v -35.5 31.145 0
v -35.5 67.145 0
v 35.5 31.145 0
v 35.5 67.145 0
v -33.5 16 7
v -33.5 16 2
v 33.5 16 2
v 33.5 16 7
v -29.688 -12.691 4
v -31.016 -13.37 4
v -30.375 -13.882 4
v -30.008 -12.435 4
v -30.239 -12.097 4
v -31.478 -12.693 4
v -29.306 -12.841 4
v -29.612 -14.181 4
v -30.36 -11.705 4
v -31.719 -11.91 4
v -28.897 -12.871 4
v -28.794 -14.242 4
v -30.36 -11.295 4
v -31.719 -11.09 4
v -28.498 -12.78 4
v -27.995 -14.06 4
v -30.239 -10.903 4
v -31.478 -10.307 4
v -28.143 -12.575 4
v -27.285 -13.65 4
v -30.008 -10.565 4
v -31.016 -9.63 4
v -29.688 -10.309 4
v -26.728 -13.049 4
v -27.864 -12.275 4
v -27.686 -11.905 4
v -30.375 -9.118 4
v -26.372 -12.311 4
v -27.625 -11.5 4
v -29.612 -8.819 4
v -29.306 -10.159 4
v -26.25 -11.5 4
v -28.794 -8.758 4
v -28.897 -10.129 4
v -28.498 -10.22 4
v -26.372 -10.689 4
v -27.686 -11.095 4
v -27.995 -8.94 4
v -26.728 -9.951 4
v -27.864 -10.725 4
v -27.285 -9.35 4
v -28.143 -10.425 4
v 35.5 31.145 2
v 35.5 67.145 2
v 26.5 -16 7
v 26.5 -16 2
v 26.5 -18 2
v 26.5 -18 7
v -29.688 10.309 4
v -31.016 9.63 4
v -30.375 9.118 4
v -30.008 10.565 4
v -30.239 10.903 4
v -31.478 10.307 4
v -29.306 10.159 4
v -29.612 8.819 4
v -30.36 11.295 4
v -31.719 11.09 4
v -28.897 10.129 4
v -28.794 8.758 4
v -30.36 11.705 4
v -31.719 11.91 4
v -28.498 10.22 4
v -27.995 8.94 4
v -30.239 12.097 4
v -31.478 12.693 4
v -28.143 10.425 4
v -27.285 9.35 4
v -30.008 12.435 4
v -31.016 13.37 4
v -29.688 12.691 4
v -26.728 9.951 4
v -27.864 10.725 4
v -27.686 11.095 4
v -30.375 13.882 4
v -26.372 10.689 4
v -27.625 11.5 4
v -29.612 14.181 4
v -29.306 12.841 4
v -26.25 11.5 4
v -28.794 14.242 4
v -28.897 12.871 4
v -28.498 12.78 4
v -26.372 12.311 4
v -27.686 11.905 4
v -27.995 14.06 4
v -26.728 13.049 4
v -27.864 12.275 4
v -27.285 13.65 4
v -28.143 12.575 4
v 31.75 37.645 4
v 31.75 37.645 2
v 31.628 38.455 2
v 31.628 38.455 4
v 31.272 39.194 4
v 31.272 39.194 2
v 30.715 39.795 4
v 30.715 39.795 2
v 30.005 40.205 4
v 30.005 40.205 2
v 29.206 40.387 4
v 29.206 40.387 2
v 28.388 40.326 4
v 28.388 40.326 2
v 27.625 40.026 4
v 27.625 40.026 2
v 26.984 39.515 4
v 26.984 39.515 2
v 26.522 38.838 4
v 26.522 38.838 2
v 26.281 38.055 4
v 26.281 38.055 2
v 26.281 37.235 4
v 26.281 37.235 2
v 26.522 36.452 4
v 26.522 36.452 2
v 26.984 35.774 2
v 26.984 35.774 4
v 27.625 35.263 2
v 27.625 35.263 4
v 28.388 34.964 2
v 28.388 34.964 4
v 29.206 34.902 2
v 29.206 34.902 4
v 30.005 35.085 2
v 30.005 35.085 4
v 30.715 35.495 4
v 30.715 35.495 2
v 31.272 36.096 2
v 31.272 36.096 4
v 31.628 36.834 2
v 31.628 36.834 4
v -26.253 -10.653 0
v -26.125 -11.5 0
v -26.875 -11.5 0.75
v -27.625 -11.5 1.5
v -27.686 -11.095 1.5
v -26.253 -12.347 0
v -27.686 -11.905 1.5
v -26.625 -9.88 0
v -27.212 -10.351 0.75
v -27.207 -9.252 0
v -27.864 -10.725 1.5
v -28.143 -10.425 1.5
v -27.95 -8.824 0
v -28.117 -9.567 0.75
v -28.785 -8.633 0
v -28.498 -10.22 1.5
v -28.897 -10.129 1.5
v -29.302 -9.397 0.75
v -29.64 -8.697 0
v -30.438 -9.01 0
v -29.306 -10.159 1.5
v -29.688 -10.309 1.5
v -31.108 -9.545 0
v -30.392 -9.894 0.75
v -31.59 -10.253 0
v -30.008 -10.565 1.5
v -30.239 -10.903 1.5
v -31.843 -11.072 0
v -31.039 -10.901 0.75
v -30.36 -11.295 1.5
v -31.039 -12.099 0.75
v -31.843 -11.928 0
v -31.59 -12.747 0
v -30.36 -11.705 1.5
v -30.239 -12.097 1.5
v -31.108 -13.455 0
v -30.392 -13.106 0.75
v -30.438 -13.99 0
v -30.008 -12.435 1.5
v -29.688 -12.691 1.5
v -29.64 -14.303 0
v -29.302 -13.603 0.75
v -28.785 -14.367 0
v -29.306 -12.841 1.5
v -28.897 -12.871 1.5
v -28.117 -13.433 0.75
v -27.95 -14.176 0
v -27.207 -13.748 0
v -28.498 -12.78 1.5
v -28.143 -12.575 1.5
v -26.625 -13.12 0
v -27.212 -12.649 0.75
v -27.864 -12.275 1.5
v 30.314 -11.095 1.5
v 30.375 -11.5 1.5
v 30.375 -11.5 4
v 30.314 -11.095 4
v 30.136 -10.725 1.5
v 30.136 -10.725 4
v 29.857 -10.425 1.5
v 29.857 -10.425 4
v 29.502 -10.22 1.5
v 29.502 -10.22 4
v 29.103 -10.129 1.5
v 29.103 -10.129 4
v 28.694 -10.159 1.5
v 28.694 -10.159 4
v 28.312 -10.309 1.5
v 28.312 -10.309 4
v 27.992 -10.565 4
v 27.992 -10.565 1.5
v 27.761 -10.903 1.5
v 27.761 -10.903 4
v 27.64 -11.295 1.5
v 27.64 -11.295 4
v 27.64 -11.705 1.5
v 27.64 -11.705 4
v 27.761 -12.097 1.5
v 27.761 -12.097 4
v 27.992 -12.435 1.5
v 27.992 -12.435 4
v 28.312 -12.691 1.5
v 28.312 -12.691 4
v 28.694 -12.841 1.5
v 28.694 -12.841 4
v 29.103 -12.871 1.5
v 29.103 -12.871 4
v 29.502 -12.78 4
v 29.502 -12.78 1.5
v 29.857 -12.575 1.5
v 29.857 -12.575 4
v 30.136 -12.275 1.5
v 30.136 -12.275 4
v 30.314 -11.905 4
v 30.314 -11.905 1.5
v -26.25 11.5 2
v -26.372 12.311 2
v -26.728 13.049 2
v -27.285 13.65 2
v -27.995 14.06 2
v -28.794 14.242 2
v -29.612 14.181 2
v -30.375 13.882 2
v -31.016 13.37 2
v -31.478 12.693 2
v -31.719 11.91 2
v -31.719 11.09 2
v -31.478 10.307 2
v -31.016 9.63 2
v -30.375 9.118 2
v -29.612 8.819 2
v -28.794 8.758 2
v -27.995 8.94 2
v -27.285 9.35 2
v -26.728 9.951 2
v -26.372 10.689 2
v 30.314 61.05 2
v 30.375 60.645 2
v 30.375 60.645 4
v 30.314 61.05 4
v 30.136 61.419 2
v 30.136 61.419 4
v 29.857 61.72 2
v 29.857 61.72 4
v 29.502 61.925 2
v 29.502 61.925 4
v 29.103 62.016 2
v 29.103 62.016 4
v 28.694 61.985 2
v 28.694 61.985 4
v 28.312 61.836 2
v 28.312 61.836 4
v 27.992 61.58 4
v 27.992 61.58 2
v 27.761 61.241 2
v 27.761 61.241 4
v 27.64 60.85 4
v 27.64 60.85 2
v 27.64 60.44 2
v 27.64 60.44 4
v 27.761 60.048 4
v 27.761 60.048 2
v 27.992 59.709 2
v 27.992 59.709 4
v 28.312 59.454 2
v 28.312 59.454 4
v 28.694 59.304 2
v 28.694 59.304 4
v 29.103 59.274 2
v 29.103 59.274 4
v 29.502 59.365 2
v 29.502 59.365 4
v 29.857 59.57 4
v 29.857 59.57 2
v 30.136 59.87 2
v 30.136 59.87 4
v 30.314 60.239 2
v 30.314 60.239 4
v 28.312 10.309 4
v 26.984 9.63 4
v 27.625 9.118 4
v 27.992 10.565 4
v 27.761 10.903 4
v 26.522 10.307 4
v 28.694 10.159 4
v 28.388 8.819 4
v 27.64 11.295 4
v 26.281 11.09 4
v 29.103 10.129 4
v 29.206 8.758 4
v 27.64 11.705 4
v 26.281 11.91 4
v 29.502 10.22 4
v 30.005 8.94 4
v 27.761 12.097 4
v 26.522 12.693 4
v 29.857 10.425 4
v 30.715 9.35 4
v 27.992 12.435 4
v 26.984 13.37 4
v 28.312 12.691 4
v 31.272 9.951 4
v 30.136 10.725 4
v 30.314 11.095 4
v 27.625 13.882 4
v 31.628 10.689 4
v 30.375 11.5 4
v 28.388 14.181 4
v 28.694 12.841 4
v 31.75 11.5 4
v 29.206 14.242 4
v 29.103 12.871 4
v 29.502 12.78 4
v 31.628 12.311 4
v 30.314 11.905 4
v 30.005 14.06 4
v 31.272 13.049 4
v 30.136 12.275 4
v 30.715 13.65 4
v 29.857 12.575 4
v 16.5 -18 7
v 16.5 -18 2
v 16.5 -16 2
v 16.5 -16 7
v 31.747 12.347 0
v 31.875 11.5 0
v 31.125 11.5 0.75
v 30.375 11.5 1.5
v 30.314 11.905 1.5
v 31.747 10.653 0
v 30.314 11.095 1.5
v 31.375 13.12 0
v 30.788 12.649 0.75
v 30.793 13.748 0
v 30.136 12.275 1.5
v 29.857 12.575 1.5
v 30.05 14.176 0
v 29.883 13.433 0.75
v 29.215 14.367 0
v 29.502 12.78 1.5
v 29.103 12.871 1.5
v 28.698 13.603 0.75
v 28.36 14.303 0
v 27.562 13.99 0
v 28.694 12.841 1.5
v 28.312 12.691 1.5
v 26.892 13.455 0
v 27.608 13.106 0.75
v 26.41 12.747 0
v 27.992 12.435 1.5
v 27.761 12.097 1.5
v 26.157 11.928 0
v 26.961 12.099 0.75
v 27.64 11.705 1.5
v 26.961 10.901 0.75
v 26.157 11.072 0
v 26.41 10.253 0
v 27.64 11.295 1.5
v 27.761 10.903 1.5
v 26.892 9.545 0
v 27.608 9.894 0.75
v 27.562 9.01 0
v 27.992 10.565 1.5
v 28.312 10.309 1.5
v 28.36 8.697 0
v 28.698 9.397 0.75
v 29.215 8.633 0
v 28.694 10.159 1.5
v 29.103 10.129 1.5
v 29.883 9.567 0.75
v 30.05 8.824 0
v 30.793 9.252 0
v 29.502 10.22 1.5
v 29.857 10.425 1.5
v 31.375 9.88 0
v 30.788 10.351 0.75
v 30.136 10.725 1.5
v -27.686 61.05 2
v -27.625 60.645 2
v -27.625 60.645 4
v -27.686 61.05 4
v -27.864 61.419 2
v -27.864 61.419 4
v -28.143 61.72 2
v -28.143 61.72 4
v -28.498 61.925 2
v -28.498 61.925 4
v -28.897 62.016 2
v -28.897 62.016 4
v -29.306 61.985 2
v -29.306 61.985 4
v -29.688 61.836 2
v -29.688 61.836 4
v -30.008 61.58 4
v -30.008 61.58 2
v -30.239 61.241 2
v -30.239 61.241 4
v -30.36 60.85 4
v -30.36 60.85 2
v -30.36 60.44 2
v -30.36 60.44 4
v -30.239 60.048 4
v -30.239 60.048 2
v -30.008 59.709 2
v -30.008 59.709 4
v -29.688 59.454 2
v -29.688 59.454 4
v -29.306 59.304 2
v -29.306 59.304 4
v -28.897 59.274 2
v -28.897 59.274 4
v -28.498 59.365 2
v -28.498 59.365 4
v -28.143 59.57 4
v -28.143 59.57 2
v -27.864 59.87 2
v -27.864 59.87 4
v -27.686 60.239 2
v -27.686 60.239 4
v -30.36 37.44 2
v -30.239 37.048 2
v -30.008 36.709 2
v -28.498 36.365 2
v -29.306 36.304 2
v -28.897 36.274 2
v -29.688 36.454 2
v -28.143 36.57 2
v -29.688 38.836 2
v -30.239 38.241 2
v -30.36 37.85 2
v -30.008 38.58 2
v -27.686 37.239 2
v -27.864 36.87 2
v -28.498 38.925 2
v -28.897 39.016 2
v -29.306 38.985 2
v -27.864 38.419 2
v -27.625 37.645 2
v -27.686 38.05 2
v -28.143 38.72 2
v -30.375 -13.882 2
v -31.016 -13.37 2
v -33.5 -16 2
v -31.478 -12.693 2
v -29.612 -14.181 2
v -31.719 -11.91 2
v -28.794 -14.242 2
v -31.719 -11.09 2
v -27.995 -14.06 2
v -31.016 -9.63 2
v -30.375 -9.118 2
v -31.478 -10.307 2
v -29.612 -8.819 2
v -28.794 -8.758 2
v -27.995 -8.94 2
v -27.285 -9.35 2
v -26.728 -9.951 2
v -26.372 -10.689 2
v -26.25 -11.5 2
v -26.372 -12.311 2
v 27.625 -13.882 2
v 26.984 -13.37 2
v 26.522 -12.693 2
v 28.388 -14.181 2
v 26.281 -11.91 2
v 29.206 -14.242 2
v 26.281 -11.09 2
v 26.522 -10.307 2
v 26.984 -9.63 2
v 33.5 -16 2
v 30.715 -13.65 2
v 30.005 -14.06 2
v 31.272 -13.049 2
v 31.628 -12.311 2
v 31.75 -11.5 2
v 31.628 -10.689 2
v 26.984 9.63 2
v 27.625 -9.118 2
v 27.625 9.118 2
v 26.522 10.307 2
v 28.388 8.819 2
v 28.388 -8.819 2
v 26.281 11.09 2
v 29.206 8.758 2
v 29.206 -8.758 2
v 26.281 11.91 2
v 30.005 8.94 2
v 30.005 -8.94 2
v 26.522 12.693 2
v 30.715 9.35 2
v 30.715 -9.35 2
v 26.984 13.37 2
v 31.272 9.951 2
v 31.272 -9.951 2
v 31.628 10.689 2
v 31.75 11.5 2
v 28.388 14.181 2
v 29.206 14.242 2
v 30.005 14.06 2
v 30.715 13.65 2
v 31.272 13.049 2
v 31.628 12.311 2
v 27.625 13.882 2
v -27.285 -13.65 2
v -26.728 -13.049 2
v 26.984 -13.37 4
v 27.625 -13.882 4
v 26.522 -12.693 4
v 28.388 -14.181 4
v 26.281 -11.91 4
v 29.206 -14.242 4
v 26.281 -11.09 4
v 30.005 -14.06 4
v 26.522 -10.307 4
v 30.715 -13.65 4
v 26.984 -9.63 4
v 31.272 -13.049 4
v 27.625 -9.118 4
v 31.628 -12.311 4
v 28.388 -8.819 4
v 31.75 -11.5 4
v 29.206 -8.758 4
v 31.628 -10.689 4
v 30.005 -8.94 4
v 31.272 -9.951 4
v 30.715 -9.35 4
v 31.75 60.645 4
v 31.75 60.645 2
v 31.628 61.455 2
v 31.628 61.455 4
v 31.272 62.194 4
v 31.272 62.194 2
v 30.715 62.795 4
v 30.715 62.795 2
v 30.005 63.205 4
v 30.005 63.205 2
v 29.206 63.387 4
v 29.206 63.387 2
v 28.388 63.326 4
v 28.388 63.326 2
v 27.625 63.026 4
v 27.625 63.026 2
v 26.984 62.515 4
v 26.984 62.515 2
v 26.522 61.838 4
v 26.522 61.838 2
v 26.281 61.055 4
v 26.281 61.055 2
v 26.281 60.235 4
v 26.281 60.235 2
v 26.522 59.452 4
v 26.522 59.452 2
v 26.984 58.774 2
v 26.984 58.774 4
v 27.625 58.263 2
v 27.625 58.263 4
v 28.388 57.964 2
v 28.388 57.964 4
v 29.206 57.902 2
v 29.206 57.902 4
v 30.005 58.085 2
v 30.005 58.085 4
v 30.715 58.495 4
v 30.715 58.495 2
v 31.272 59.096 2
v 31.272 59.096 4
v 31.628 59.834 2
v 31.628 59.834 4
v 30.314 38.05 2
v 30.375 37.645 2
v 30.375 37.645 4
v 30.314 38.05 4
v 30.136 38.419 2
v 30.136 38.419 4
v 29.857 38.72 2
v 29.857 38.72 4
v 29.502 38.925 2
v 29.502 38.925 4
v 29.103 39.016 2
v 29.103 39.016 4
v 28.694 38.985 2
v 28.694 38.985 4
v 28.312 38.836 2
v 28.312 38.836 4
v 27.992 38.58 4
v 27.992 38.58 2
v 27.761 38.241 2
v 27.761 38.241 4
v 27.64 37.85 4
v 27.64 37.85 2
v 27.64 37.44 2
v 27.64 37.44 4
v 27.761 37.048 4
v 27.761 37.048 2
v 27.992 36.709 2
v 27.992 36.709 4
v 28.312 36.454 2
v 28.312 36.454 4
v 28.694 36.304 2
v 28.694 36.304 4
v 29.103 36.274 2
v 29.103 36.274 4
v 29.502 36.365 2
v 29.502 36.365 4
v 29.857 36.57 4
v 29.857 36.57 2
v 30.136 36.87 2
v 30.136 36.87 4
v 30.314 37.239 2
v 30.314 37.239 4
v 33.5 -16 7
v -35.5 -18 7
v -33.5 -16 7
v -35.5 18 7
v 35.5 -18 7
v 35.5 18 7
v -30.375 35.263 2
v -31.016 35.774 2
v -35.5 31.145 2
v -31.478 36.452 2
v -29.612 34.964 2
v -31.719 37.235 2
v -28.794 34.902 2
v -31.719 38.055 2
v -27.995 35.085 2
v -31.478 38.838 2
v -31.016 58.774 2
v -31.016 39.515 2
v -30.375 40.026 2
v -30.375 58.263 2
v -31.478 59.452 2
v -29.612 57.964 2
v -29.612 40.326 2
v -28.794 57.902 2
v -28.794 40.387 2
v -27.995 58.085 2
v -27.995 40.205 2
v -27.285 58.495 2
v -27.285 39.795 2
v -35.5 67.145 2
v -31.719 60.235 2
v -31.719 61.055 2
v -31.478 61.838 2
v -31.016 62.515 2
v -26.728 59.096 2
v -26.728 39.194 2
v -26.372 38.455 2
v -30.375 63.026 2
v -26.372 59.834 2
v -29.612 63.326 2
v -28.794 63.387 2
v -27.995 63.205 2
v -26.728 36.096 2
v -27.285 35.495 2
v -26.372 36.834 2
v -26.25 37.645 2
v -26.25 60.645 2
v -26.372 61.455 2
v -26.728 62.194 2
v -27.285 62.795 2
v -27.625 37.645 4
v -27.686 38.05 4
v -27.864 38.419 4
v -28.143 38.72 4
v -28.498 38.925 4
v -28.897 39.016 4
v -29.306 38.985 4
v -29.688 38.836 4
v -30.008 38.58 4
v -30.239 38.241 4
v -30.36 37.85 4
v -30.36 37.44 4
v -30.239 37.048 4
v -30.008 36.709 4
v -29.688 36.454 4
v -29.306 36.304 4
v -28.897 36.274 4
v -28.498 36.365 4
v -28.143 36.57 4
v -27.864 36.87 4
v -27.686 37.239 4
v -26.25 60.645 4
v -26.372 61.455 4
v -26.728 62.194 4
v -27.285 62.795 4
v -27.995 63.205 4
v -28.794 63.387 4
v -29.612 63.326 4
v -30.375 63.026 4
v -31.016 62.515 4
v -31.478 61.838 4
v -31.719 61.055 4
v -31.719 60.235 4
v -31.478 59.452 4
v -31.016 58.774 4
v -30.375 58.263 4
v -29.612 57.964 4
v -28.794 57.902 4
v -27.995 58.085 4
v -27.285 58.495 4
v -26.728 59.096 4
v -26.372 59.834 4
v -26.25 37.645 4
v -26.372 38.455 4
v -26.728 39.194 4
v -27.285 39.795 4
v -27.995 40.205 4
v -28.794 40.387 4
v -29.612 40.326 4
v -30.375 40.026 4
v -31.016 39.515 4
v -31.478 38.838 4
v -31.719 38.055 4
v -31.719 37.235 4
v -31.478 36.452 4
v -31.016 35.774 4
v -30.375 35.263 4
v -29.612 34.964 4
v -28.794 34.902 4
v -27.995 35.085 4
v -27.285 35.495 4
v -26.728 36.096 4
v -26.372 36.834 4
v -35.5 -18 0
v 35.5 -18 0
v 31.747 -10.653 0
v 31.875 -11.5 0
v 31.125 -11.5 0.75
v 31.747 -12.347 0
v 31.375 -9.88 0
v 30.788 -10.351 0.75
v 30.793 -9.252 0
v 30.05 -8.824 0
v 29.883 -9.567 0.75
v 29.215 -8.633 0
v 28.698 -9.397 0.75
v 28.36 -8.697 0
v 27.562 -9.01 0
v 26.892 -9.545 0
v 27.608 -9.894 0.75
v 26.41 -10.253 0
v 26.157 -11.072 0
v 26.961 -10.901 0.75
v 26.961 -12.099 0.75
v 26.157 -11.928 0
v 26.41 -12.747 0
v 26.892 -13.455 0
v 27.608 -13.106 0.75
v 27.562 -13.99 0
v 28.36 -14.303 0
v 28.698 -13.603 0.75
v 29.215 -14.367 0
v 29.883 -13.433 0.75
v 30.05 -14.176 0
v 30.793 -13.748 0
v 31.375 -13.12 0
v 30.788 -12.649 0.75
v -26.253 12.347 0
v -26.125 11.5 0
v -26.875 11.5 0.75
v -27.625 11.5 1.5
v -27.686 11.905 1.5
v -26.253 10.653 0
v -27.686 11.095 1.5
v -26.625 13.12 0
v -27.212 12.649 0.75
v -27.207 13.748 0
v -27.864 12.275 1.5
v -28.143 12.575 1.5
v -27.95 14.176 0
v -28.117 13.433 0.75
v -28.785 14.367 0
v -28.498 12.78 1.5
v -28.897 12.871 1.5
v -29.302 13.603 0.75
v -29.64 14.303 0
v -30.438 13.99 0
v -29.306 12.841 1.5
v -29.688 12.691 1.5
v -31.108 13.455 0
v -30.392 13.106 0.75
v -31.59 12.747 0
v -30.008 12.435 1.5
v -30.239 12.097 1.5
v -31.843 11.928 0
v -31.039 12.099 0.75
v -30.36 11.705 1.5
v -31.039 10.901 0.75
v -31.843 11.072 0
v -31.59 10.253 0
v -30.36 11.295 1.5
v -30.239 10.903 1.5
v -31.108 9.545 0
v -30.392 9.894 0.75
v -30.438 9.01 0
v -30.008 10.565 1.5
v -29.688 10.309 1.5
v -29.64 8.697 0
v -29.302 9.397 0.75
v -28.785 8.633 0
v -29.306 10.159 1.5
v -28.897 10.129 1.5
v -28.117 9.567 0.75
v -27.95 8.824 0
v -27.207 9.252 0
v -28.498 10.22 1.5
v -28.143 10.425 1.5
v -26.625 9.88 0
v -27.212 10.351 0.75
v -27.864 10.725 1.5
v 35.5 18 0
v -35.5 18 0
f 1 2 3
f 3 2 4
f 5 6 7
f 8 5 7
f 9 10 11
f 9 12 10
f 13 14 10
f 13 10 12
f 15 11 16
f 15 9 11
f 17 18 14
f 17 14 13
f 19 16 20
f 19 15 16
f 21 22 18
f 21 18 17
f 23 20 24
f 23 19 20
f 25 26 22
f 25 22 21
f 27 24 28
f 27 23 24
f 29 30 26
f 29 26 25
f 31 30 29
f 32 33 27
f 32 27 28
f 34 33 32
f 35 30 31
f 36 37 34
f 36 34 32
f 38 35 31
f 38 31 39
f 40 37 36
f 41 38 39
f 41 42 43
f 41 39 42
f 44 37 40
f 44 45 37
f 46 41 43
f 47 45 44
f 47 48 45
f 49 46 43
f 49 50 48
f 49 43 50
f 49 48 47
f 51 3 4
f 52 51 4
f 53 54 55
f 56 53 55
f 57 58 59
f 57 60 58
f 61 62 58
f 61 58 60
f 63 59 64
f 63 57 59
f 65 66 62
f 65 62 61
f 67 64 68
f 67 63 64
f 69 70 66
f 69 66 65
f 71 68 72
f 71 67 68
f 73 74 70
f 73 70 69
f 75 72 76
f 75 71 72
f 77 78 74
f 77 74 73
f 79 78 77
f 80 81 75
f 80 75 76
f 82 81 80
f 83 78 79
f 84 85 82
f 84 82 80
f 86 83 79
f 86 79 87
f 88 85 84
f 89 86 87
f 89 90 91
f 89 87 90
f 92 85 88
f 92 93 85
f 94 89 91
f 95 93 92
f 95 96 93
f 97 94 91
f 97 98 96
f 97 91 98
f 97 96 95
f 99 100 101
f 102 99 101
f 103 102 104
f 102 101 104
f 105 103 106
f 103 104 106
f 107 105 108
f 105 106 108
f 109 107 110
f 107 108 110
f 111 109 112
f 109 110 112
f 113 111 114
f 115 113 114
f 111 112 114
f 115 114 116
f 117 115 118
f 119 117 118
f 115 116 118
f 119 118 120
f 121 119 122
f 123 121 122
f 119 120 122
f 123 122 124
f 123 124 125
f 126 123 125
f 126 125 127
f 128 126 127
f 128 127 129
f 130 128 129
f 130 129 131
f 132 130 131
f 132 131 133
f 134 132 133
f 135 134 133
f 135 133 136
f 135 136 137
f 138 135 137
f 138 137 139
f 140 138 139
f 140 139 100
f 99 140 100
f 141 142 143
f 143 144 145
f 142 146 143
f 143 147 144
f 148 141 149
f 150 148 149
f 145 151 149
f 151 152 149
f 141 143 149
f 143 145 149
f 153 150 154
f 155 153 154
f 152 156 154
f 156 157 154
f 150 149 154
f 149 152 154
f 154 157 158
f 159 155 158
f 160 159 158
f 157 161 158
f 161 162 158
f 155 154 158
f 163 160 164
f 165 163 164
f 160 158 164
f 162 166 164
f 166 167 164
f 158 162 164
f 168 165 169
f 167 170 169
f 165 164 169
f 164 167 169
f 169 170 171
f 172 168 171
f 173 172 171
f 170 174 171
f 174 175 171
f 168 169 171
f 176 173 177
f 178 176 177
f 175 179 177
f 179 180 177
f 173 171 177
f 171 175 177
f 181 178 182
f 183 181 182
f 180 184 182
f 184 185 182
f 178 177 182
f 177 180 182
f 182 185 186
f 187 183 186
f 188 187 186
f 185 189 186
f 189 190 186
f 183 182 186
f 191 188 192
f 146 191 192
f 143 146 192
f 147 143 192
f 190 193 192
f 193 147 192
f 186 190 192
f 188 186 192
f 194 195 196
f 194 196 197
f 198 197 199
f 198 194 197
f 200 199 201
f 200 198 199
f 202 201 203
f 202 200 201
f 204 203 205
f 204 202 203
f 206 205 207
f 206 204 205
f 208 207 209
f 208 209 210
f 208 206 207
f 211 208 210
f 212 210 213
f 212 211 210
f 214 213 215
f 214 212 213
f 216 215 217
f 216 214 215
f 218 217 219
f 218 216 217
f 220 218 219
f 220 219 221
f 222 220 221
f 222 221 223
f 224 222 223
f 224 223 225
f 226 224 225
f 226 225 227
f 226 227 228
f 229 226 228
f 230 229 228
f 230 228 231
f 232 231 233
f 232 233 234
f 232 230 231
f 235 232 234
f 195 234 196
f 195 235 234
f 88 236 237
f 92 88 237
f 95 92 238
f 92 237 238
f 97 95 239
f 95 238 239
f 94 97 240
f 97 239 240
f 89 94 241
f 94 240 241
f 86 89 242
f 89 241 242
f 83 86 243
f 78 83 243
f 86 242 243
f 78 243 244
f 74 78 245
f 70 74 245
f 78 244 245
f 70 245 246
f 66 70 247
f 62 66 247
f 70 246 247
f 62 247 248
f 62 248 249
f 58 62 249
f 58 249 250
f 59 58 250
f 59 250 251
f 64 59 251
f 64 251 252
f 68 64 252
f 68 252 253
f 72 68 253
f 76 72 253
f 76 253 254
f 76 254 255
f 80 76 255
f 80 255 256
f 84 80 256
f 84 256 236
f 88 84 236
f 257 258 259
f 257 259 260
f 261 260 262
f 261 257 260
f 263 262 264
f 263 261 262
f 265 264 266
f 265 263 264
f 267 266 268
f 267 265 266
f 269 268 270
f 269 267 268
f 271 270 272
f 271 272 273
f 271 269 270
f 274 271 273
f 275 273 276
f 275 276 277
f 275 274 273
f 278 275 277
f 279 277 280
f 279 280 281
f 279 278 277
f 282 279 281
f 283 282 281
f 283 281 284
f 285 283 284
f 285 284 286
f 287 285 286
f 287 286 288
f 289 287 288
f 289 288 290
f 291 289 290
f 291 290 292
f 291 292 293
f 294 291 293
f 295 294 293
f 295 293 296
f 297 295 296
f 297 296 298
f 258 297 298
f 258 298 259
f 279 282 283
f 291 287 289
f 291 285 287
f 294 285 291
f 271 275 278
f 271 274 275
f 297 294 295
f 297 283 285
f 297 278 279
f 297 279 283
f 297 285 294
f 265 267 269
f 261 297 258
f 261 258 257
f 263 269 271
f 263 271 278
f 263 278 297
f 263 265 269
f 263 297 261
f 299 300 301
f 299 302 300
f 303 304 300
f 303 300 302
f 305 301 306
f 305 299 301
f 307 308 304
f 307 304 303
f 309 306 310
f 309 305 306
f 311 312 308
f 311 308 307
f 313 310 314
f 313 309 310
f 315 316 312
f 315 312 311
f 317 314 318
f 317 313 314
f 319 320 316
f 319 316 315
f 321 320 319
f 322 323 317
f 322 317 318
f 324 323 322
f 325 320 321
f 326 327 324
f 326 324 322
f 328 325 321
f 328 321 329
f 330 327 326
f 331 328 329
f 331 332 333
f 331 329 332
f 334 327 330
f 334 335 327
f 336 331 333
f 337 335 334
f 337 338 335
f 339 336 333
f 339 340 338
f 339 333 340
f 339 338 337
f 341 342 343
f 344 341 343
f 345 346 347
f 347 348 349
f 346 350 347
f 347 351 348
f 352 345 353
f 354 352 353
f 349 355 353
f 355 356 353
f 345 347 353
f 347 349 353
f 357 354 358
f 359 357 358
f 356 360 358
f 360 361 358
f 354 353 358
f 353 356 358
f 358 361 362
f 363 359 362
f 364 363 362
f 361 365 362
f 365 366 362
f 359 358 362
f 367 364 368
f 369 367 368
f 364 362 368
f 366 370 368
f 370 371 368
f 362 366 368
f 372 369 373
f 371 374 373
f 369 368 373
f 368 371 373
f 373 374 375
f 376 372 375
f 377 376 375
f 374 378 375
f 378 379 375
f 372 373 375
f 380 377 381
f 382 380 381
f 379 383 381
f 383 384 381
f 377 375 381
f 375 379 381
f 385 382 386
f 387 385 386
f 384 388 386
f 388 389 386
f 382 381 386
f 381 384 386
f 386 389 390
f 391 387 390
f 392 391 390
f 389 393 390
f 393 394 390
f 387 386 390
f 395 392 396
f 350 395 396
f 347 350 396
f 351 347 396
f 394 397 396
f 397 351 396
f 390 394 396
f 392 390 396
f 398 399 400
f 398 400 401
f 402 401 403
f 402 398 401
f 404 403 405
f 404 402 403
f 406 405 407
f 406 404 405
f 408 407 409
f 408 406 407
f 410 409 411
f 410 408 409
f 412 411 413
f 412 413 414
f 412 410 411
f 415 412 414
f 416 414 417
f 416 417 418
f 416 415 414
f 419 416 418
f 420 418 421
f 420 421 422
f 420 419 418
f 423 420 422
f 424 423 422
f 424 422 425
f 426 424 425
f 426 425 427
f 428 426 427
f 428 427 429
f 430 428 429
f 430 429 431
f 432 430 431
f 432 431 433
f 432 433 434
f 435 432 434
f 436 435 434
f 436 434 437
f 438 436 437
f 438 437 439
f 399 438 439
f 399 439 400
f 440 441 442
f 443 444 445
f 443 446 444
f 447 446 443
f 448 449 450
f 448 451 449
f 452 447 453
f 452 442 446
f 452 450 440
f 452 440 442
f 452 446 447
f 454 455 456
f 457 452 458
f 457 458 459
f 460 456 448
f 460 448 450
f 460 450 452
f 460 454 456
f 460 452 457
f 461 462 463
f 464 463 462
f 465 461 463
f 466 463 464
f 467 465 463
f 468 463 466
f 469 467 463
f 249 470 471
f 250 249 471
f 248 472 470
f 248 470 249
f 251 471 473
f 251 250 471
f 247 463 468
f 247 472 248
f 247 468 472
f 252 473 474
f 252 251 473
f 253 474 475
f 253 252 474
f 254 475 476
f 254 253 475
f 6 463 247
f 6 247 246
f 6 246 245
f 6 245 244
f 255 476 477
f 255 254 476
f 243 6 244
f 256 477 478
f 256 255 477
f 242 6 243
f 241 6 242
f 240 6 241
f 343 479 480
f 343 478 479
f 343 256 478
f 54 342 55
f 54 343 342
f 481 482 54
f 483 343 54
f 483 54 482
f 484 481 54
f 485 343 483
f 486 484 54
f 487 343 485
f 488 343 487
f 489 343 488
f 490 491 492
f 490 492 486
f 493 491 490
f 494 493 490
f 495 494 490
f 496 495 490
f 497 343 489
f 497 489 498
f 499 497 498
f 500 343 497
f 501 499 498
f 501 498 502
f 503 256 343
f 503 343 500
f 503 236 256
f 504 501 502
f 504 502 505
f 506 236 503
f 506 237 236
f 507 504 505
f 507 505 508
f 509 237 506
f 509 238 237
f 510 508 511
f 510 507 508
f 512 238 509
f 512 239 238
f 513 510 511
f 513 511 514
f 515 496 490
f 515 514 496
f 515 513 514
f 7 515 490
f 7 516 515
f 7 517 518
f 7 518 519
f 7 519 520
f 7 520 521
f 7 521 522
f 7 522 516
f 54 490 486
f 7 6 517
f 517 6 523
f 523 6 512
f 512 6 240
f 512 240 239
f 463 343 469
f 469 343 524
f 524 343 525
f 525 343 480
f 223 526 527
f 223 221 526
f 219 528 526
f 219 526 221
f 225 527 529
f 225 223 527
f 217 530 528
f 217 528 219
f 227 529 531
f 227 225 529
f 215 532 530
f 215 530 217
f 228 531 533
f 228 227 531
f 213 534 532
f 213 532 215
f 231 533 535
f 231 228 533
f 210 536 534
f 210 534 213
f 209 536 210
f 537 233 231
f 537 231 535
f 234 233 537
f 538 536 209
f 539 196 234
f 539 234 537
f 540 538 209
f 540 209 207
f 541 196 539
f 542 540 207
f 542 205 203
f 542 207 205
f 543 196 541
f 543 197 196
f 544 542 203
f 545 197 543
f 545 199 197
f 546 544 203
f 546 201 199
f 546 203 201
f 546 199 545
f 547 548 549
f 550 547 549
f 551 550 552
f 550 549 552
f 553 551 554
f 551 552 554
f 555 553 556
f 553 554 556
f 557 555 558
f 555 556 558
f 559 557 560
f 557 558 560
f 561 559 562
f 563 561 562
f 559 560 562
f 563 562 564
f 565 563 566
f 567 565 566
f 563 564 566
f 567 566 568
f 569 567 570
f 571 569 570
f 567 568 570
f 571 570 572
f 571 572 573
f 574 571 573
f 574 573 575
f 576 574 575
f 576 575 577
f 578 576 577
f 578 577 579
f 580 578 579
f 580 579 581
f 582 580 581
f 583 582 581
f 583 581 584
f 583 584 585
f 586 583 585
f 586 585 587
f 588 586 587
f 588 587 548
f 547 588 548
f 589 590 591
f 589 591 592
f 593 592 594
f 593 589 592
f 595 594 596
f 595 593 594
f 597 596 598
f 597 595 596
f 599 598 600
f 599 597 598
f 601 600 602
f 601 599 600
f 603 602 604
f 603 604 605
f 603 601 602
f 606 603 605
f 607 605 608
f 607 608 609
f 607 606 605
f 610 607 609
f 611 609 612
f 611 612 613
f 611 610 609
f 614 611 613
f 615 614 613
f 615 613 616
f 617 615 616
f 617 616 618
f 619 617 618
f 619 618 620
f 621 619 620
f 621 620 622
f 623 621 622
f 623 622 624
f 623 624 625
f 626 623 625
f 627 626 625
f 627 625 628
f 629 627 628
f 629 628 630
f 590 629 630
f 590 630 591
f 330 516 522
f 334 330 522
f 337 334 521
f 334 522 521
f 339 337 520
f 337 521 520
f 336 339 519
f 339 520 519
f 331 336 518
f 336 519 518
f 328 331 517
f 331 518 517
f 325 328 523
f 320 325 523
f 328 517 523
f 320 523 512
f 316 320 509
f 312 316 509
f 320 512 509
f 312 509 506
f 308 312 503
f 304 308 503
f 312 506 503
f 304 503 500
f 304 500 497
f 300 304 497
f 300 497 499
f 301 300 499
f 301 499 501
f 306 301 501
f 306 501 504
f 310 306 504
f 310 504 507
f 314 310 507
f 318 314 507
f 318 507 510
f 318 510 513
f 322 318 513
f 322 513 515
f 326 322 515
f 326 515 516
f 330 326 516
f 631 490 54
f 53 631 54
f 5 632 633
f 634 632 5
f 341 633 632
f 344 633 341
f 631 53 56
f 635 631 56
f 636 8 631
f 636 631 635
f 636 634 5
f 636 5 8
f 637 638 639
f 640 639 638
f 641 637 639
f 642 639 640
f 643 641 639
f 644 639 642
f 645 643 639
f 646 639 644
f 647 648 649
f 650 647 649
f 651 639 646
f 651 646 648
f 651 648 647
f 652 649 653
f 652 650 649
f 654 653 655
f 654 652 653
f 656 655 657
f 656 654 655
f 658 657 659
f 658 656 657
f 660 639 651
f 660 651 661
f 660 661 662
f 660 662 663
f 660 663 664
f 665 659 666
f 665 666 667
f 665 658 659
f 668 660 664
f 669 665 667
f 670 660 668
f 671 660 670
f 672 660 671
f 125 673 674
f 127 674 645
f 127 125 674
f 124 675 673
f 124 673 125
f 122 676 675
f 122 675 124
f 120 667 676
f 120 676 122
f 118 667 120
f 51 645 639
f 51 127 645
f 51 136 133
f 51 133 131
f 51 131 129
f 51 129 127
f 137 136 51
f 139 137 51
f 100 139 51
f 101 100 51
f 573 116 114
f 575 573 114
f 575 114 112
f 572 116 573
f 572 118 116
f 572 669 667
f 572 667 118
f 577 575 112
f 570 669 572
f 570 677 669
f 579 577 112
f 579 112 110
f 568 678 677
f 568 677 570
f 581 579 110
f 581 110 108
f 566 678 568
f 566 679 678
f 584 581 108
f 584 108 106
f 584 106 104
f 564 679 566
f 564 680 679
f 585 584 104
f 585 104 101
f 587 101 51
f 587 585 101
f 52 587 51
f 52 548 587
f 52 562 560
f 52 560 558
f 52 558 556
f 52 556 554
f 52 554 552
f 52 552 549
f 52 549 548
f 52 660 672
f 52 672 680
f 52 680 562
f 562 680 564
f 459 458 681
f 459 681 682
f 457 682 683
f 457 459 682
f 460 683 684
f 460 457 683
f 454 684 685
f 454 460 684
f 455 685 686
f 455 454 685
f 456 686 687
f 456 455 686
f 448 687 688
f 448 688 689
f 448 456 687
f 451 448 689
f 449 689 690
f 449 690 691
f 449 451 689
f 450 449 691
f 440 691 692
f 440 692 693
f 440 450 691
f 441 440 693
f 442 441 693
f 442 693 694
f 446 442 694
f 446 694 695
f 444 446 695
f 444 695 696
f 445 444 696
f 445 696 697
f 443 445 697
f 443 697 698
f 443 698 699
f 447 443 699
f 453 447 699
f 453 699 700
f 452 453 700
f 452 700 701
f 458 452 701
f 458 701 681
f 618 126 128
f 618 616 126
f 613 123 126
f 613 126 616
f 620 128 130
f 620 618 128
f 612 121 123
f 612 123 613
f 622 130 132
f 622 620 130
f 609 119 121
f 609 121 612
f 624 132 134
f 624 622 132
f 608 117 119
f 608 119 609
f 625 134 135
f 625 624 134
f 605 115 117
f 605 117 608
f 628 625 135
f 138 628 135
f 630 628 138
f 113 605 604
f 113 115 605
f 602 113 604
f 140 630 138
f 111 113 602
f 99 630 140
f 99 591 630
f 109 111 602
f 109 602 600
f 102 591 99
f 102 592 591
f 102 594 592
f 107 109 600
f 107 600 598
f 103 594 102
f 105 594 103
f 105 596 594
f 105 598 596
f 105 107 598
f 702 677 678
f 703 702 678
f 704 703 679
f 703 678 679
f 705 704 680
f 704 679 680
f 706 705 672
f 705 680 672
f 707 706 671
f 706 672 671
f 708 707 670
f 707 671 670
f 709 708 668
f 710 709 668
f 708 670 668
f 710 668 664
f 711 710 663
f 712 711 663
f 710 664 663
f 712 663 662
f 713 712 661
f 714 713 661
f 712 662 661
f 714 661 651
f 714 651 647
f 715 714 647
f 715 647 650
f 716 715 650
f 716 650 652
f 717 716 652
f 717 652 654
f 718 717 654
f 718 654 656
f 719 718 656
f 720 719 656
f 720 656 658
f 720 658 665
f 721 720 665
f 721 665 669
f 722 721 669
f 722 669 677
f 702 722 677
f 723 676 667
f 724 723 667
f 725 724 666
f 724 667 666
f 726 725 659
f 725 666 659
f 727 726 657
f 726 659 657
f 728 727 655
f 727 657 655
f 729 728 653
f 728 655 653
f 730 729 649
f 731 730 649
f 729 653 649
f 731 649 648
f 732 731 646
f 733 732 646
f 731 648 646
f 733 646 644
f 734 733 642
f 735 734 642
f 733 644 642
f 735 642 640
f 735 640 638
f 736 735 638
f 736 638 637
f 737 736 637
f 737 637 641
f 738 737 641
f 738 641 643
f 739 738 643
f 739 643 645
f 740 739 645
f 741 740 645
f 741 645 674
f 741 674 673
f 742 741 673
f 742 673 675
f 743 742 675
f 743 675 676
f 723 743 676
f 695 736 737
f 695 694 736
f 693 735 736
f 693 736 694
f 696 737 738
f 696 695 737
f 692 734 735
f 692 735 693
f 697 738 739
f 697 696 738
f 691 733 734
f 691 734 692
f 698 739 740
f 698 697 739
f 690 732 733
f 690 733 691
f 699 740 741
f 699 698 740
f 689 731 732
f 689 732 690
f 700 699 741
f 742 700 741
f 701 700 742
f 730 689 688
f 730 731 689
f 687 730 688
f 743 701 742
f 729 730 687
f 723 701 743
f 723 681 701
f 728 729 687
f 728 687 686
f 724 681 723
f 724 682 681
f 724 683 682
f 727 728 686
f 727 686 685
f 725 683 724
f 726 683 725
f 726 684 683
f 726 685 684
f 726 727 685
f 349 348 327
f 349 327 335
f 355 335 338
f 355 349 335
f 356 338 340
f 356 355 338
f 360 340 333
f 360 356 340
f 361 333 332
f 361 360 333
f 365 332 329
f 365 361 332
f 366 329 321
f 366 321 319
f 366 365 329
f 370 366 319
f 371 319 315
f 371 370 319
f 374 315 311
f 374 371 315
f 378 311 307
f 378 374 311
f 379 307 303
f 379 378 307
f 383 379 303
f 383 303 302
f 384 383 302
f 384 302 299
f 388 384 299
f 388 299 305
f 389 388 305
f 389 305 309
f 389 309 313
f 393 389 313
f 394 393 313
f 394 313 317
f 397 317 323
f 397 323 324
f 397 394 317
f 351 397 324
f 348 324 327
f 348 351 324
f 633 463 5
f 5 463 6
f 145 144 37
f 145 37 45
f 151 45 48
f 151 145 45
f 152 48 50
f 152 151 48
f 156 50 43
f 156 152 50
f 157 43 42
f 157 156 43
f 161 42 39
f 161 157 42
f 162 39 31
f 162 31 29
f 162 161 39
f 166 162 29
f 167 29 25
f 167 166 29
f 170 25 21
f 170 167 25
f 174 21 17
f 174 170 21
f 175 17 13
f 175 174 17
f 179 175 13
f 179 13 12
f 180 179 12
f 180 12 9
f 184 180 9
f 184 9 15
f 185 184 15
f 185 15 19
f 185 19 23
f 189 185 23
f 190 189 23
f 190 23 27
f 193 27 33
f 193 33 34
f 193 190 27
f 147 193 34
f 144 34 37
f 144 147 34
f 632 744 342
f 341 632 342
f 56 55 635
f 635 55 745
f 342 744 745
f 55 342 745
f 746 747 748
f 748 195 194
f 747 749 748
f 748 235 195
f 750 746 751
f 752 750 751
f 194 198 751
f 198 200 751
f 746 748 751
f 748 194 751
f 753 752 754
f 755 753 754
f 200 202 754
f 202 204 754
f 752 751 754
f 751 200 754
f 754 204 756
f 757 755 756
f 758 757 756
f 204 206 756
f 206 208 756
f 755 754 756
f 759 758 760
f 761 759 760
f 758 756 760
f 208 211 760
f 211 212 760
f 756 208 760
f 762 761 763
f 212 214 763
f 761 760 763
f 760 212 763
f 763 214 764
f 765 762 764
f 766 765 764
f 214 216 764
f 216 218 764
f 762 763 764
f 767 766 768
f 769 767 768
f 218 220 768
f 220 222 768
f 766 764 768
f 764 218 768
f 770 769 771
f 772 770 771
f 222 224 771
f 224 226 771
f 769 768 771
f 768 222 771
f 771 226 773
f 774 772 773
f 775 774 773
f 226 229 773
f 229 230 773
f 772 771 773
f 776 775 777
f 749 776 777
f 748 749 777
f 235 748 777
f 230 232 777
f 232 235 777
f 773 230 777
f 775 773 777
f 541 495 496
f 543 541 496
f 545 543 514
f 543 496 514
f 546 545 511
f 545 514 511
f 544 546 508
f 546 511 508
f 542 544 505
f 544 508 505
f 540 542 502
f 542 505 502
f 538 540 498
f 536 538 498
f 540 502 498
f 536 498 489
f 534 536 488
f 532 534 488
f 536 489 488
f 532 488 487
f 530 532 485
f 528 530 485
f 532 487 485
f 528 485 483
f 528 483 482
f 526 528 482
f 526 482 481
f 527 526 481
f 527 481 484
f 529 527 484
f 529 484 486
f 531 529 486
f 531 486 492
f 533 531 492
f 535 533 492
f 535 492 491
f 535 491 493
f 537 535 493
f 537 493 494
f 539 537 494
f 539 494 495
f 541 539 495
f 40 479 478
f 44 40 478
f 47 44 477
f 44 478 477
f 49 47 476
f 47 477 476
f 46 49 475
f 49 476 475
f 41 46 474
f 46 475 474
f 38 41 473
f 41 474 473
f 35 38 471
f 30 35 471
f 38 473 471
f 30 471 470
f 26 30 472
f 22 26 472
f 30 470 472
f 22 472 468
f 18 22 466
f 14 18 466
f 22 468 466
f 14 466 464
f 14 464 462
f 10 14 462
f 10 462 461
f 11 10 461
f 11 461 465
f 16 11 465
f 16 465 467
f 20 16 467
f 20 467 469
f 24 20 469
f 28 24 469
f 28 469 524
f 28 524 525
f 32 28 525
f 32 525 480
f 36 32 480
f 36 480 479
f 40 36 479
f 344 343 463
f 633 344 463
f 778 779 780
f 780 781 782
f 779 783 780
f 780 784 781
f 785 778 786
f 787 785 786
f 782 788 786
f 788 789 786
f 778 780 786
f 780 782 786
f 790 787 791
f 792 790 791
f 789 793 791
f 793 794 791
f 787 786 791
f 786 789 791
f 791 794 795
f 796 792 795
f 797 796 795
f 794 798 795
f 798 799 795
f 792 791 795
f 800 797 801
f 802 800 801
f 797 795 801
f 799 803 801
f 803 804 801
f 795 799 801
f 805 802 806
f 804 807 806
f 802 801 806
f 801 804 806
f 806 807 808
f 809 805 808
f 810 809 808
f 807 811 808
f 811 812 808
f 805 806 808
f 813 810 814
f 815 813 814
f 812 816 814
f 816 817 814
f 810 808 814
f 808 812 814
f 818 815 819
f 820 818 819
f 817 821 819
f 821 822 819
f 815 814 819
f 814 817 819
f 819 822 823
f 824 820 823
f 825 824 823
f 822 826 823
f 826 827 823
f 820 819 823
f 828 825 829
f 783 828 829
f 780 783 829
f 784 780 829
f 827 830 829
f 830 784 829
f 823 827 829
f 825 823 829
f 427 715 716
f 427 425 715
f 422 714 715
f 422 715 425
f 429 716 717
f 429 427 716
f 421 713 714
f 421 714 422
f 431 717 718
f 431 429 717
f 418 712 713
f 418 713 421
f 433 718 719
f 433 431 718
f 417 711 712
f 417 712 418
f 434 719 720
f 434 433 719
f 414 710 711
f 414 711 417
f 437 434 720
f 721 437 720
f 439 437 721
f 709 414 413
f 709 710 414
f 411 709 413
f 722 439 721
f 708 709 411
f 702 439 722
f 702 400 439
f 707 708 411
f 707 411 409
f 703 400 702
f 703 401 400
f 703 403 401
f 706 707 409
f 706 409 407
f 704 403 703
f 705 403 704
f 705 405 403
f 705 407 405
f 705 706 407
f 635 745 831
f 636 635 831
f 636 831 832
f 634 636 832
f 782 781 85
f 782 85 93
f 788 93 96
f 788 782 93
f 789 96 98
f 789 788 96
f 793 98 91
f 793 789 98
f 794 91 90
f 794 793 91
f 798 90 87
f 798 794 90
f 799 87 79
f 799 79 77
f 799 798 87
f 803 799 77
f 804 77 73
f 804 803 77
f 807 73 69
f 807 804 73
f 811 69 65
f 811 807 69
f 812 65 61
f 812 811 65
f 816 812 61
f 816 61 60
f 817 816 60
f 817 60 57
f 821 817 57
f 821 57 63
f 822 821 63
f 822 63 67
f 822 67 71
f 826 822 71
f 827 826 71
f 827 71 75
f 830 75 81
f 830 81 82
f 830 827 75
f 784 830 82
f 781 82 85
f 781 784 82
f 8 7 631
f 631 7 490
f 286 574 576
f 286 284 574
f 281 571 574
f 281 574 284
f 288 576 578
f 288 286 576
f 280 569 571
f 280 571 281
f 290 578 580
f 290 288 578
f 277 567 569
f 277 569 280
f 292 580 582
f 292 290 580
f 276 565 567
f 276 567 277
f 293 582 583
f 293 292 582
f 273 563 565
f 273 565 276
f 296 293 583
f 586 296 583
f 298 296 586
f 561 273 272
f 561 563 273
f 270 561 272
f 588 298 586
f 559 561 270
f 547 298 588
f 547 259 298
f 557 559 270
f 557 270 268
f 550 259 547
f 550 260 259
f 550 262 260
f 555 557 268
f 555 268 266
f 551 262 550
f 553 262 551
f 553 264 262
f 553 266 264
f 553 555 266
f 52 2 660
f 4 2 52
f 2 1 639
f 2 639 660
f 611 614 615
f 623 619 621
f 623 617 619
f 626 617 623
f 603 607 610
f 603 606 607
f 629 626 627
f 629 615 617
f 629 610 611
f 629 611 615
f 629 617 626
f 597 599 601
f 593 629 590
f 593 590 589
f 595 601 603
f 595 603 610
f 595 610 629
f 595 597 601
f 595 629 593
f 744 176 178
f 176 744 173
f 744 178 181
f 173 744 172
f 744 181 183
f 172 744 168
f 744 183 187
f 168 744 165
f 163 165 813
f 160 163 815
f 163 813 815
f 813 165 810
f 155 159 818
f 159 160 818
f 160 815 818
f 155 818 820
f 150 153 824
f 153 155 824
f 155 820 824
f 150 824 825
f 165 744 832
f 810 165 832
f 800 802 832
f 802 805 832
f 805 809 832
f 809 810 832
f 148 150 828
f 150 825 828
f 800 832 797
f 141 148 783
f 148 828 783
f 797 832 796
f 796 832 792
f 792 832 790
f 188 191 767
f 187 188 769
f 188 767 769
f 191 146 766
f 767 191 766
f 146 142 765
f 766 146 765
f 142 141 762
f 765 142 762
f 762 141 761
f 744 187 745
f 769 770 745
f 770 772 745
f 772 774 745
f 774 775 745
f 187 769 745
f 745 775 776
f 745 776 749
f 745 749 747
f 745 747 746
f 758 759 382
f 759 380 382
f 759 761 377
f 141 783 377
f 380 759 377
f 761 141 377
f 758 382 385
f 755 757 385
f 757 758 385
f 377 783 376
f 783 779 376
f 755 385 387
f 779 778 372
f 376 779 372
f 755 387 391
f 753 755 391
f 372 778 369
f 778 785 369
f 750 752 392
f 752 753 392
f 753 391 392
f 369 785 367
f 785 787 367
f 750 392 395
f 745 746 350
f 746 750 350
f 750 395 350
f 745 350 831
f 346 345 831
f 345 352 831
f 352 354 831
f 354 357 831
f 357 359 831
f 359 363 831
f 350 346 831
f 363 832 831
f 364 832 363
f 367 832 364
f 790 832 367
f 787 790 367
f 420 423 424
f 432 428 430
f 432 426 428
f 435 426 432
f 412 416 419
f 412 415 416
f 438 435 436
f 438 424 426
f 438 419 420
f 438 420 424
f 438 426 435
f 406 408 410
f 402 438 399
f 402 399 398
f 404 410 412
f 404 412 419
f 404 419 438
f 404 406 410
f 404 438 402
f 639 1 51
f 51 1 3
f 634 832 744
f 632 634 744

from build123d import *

# Parameters (mm, degrees)
F0_R     = 2.75
F0_W     = 10
F0_H     = 1
F0_R_2   = 1.375
F0_H_2   = 2
F1_DEPTH = 2
F2_DEPTH = 4
F3_DEPTH = 7
F4_SIZE  = 1.5
F5_W     = 71
F5_H     = 36
F5_R     = 2.75
F5_R_2   = 1.375
F6_DEPTH = 2
F7_DEPTH = 4


with BuildPart() as f1:
    # F0 (on Top) → F1 (new body)
    with BuildSketch(Plane.XY):
        Polygon((33.5, -16), (26.5, -16), (26.5, -18), (35.5, -18), (35.5, 18), (-35.5, 18), (-35.5, -18), (16.5, -18), (16.5, -16), (-33.5, -16), (-33.5, 16), (33.5, 16), align=None)
        Polygon((26.5, -15), (32.5, -15), (32.5, 15), (-32.5, 15), (-32.5, -15), (16.5, -15), align=None)
        with Locations((-29, -11.5)):
            Circle(F0_R, mode=Mode.SUBTRACT)
        with Locations((29, -11.5)):
            Circle(F0_R, mode=Mode.SUBTRACT)
        with Locations((-29, 11.5)):
            Circle(F0_R, mode=Mode.SUBTRACT)
        with Locations((29, 11.5)):
            Circle(F0_R, mode=Mode.SUBTRACT)
        Polygon((32.5, 15), (32.5, -15), (26.5, -15), (26.5, -16), (33.5, -16), (33.5, 16), (-33.5, 16), (-33.5, -16), (16.5, -16), (16.5, -15), (-32.5, -15), (-32.5, 15), align=None)
        with Locations((21.5, -15.5)):
            Rectangle(F0_W, F0_H)
        with Locations((29, 11.5)):
            Circle(F0_R)
        with Locations((29, 11.5)):
            Circle(F0_R_2, mode=Mode.SUBTRACT)
        with Locations((29, -11.5)):
            Circle(F0_R)
        with Locations((29, -11.5)):
            Circle(F0_R_2, mode=Mode.SUBTRACT)
        with Locations((-29, 11.5)):
            Circle(F0_R)
        with Locations((-29, 11.5)):
            Circle(F0_R_2, mode=Mode.SUBTRACT)
        with Locations((-29, -11.5)):
            Circle(F0_R)
        with Locations((-29, -11.5)):
            Circle(F0_R_2, mode=Mode.SUBTRACT)
        with Locations((21.5, -17)):
            Rectangle(F0_W, F0_H_2)
    extrude(amount=F1_DEPTH)

    # F0 (on Top) → F2 (join)
    with BuildSketch(Plane.XY):
        with Locations((29, 11.5)):
            Circle(F0_R)
        with Locations((29, 11.5)):
            Circle(F0_R_2, mode=Mode.SUBTRACT)
        with Locations((29, -11.5)):
            Circle(F0_R)
        with Locations((29, -11.5)):
            Circle(F0_R_2, mode=Mode.SUBTRACT)
        with Locations((-29, 11.5)):
            Circle(F0_R)
        with Locations((-29, 11.5)):
            Circle(F0_R_2, mode=Mode.SUBTRACT)
        with Locations((-29, -11.5)):
            Circle(F0_R)
        with Locations((-29, -11.5)):
            Circle(F0_R_2, mode=Mode.SUBTRACT)
    extrude(amount=F2_DEPTH)

    # F0 (on Top) → F3 (join)
    with BuildSketch(Plane.XY):
        Polygon((33.5, -16), (26.5, -16), (26.5, -18), (35.5, -18), (35.5, 18), (-35.5, 18), (-35.5, -18), (16.5, -18), (16.5, -16), (-33.5, -16), (-33.5, 16), (33.5, 16), align=None)
    extrude(amount=F3_DEPTH)

    # F4
    f4_edges = [f1.edges().sort_by_distance(p)[0] for p in [
        (-30.375, -11.5, 0),
        (27.625, -11.5, 0),
        (27.625, 11.5, 0),
        (-30.375, 11.5, 0),
    ]]
    chamfer(f4_edges, length=F4_SIZE)


with BuildPart() as f6:
    # F5 (on Top) → F6 (new body)
    with BuildSketch(Plane.XY):
        with Locations((0, 49.1447374225)):
            Rectangle(F5_W, F5_H)
        with Locations((-29, 37.6447374225)):
            Circle(F5_R, mode=Mode.SUBTRACT)
        with Locations((29, 37.6447374225)):
            Circle(F5_R, mode=Mode.SUBTRACT)
        with Locations((-29, 60.6447374225)):
            Circle(F5_R, mode=Mode.SUBTRACT)
        with Locations((29, 60.6447374225)):
            Circle(F5_R, mode=Mode.SUBTRACT)
        with Locations((-29, 60.6447374225)):
            Circle(F5_R)
        with Locations((-29, 60.6447374225)):
            Circle(F5_R_2, mode=Mode.SUBTRACT)
        with Locations((-29, 37.6447374225)):
            Circle(F5_R)
        with Locations((-29, 37.6447374225)):
            Circle(F5_R_2, mode=Mode.SUBTRACT)
        with Locations((29, 60.6447374225)):
            Circle(F5_R)
        with Locations((29, 60.6447374225)):
            Circle(F5_R_2, mode=Mode.SUBTRACT)
        with Locations((29, 37.6447374225)):
            Circle(F5_R)
        with Locations((29, 37.6447374225)):
            Circle(F5_R_2, mode=Mode.SUBTRACT)
        with Locations((-29, 60.6447374225)):
            Circle(F5_R_2)
        with Locations((-29, 37.6447374225)):
            Circle(F5_R_2)
        with Locations((29, 60.6447374225)):
            Circle(F5_R_2)
        with Locations((29, 37.6447374225)):
            Circle(F5_R_2)
    extrude(amount=F6_DEPTH)

    # F5 (on Top) → F7 (join)
    with BuildSketch(Plane.XY):
        with Locations((-29, 37.6447374225)):
            Circle(F5_R)
        with Locations((-29, 37.6447374225)):
            Circle(F5_R_2, mode=Mode.SUBTRACT)
        with Locations((29, 37.6447374225)):
            Circle(F5_R)
        with Locations((29, 37.6447374225)):
            Circle(F5_R_2, mode=Mode.SUBTRACT)
        with Locations((29, 60.6447374225)):
            Circle(F5_R)
        with Locations((29, 60.6447374225)):
            Circle(F5_R_2, mode=Mode.SUBTRACT)
        with Locations((-29, 60.6447374225)):
            Circle(F5_R)
        with Locations((-29, 60.6447374225)):
            Circle(F5_R_2, mode=Mode.SUBTRACT)
    extrude(amount=F7_DEPTH)


solid = Compound([f1.part, f6.part])
